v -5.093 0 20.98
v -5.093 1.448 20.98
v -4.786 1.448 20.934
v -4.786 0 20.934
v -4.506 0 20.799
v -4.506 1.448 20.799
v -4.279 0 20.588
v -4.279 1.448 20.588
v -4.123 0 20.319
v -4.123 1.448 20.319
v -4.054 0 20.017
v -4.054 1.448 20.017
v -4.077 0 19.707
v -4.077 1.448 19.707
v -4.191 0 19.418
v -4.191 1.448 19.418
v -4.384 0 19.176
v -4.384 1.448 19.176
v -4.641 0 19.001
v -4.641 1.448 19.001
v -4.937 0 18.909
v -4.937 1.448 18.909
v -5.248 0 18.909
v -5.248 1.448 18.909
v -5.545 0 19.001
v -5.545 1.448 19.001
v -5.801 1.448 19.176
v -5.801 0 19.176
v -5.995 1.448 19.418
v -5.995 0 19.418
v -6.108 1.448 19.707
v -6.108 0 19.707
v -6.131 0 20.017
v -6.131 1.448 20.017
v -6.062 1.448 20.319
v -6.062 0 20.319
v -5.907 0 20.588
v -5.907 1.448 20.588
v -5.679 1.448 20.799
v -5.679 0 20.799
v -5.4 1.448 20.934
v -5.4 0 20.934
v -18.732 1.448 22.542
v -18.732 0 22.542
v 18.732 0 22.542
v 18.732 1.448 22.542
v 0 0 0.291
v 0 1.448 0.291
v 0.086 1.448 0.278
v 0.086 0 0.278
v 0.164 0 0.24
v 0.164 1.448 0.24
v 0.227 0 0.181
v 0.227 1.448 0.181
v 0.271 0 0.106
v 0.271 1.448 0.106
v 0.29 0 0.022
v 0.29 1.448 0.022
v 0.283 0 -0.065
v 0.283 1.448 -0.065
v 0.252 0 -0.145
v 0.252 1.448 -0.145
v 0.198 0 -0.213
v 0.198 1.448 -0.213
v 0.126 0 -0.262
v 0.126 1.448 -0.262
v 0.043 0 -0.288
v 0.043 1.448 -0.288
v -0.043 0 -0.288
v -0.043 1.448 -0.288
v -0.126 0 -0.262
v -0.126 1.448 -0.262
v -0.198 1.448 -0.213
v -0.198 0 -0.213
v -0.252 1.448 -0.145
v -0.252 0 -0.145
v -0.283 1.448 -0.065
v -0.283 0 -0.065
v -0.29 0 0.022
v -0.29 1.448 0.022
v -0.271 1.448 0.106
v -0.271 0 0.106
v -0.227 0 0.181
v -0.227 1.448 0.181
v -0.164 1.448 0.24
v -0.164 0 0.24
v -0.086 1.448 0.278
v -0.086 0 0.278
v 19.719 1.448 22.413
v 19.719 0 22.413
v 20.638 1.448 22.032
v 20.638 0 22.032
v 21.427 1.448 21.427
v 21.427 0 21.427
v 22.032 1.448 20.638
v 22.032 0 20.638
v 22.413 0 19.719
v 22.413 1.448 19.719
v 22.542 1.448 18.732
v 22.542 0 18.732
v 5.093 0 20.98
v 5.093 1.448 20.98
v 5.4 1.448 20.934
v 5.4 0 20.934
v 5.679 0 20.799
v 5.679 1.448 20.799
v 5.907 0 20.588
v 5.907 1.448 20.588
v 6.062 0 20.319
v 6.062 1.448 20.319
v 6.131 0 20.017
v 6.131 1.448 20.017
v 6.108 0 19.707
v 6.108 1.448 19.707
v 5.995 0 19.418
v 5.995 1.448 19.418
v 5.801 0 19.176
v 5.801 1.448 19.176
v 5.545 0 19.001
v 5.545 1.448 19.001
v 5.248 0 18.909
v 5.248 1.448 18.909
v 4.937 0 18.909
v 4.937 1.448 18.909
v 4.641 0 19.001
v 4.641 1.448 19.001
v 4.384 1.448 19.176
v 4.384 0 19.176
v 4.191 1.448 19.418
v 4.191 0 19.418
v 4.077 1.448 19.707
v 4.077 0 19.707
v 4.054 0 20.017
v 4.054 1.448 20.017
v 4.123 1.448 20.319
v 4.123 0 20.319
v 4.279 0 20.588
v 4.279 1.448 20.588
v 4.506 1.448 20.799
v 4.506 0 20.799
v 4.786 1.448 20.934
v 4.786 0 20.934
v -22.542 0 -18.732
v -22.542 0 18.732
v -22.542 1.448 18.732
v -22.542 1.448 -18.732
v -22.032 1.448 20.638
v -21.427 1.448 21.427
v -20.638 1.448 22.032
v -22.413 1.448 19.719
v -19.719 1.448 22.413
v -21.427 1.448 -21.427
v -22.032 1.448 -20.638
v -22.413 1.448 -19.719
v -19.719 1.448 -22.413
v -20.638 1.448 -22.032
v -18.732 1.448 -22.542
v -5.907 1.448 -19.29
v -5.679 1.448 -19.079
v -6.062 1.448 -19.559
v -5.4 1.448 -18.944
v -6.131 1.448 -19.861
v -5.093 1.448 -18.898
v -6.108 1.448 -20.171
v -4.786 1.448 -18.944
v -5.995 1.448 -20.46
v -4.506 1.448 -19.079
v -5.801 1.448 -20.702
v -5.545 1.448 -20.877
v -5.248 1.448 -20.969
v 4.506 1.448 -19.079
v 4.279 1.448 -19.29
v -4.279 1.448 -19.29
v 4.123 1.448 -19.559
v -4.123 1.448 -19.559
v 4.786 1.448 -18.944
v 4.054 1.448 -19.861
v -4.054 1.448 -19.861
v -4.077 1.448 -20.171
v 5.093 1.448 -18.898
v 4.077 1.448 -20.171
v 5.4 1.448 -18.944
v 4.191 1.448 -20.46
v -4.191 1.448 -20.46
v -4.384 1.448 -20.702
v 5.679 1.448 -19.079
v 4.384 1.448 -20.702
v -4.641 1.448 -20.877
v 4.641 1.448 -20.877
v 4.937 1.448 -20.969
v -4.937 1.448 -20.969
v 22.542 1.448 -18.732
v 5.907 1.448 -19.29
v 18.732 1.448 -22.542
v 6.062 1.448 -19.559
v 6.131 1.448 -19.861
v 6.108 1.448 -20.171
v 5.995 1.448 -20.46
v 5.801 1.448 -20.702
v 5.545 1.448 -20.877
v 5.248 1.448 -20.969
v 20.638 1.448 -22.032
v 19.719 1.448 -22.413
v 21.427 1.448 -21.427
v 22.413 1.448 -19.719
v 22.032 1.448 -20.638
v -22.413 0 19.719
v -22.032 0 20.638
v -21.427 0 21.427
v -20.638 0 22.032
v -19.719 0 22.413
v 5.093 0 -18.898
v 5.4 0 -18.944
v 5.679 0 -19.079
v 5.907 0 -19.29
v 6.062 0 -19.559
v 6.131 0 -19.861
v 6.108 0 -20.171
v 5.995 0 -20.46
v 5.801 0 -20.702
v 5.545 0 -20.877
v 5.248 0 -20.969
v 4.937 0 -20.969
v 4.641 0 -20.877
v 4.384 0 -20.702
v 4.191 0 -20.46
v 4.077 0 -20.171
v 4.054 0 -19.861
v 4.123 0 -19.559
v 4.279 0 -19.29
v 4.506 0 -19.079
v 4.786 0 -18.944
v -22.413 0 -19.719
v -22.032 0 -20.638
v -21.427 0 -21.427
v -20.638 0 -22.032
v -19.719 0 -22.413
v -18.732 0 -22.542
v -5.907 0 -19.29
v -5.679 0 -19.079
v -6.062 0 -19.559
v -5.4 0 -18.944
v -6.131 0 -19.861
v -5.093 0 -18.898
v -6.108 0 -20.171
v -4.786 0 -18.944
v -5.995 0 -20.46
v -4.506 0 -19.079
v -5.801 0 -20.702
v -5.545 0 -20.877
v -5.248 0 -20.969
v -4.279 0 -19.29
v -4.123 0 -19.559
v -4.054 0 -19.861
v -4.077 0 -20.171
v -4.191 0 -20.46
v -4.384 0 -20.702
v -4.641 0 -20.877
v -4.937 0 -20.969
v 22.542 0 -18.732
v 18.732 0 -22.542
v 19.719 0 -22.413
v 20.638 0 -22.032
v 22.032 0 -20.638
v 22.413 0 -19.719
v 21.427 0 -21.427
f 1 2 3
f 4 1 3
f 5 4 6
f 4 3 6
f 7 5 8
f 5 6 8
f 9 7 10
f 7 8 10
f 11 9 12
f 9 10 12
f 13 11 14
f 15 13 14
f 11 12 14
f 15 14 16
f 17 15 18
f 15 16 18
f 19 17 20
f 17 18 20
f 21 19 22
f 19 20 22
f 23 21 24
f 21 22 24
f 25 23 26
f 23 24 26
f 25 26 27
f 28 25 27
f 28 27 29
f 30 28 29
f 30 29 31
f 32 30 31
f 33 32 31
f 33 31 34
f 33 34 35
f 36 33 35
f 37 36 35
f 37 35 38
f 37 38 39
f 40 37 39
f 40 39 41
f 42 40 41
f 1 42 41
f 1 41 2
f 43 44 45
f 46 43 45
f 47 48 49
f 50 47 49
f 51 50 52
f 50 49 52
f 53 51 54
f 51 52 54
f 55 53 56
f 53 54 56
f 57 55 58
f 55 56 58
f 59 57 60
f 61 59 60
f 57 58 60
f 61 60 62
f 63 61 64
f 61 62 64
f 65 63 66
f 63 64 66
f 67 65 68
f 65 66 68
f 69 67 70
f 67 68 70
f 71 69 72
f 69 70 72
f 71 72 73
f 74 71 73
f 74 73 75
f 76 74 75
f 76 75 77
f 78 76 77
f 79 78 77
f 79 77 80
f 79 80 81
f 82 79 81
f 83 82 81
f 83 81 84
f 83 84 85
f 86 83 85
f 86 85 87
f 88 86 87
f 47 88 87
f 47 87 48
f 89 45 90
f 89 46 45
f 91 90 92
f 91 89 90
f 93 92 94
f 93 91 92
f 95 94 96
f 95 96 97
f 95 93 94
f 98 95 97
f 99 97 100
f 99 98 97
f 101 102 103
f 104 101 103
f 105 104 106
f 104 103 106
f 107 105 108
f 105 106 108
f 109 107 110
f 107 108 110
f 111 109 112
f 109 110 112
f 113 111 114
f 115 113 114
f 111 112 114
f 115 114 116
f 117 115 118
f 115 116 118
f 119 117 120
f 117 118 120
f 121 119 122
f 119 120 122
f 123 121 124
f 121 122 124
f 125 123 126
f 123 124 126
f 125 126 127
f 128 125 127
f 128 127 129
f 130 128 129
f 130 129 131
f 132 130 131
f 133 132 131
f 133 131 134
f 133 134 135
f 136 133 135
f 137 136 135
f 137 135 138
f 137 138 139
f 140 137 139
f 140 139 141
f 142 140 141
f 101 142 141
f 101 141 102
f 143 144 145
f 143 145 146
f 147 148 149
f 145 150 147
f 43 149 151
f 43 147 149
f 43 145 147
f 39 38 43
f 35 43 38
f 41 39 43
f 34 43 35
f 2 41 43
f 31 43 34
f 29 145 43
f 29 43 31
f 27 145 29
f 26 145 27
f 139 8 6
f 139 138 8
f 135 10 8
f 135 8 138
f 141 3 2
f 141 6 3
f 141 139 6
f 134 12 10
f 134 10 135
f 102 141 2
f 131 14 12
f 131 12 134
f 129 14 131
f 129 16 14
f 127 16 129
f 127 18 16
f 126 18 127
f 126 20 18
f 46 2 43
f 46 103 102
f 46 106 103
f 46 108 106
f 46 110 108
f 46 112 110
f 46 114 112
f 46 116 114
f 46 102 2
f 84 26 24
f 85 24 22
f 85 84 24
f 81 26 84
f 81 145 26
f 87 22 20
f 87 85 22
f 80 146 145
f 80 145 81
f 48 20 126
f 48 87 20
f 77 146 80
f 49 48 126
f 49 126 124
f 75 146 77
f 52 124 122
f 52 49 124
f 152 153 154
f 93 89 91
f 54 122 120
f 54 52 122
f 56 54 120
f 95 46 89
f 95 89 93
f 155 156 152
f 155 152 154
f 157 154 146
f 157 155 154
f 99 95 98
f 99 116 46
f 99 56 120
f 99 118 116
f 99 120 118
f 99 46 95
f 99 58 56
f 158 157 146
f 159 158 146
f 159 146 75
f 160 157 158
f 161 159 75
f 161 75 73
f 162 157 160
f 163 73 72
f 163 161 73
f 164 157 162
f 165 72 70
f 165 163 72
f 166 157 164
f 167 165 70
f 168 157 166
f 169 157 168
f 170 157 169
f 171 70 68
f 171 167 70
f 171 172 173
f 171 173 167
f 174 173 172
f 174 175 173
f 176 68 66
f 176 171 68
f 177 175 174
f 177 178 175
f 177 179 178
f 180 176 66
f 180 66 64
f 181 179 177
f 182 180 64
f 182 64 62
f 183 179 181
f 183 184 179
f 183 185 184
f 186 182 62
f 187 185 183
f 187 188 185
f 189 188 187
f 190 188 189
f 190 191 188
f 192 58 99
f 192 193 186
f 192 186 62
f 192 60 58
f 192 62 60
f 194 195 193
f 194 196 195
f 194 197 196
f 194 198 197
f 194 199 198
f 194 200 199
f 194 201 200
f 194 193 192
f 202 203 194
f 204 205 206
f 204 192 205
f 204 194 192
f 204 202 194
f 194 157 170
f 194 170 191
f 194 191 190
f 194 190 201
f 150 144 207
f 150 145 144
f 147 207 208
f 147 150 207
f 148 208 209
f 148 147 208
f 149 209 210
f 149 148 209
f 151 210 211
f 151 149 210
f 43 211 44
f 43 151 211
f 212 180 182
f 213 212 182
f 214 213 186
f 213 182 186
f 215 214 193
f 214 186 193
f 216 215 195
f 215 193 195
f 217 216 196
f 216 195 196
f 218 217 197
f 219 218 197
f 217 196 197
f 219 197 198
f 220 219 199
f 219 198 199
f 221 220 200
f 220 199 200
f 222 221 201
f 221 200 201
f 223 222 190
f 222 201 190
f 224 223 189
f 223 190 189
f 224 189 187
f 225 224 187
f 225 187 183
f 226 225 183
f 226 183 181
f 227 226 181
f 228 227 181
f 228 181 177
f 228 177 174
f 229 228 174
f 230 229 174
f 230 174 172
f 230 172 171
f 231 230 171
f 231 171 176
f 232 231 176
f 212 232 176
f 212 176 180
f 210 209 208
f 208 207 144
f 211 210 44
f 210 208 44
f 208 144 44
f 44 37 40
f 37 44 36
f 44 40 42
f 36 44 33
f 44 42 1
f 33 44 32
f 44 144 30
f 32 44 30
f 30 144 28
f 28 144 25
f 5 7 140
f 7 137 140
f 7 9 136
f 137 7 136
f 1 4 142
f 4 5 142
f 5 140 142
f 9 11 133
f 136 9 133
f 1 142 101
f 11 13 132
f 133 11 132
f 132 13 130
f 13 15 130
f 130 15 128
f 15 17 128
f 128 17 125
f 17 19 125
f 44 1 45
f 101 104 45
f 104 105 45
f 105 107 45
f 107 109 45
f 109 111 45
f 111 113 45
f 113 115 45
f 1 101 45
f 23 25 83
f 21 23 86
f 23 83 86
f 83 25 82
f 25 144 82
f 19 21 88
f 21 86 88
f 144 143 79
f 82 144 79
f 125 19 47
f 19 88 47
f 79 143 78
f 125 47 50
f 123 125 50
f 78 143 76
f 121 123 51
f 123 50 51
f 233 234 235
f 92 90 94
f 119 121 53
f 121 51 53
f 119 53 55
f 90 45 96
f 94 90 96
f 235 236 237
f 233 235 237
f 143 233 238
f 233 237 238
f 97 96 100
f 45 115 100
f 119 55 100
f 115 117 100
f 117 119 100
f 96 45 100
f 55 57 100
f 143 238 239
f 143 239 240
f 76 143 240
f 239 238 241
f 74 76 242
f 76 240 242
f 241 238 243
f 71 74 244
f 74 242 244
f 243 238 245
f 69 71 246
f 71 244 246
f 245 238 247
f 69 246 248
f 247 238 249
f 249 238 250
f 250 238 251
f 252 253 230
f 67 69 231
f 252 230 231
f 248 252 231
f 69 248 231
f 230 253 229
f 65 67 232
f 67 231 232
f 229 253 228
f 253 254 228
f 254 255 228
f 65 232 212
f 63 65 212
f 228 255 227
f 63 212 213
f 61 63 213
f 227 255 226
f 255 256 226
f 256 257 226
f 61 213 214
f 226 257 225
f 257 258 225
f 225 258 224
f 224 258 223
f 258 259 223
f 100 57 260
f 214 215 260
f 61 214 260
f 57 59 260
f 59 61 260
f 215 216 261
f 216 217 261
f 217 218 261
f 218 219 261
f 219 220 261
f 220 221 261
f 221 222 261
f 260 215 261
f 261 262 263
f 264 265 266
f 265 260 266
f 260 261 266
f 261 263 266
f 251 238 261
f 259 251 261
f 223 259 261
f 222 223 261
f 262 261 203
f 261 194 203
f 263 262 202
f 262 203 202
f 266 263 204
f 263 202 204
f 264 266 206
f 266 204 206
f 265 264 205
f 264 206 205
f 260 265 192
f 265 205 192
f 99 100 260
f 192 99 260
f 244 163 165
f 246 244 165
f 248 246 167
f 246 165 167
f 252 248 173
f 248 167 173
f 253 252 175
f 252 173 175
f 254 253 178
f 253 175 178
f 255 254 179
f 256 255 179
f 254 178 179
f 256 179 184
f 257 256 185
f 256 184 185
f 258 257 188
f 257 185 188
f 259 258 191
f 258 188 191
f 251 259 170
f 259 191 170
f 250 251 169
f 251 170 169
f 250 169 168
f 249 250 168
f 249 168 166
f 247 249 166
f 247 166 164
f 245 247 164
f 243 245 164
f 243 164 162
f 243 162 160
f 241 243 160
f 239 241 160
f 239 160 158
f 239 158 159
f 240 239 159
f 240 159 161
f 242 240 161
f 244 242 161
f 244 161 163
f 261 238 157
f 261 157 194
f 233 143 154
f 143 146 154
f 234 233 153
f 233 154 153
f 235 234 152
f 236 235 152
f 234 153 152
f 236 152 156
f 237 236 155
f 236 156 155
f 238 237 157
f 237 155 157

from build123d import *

# Parameters (mm, degrees)
SKETCH1_W           = 45.085
SKETCH1_H           = 45.085
BOSS_EXTRUDE1_DEPTH = 1.4478
SKETCH2_R           = 0.290766207
SKETCH2_R_2         = 1.0414
CUT_EXTRUDE1_DEPTH  = 3.54
FILLET1_R           = 3.81


with BuildPart() as part:
    # Sketch1 → Boss-Extrude1 (new body)
    with BuildSketch(Plane(origin=(0, 0, 0), x_dir=(1, 0, 0), z_dir=(0, 1, 0))):
        Rectangle(SKETCH1_W, SKETCH1_H)
    extrude(amount=BOSS_EXTRUDE1_DEPTH)

    # Sketch2 → Cut-Extrude1 (cut)
    with BuildSketch(Plane(origin=(0, 1.4478, 0), x_dir=(1, 0, 0), z_dir=(0, 1, 0))):
        with Locations(Location((0, 0, 0), (0, 0, 270))):
            Circle(SKETCH2_R)
        with Locations(Location((-5.0927, 19.939, 0), (0, 0, 270))):
            Circle(SKETCH2_R_2)
        with Locations(Location((5.0927, 19.939, 0), (0, 0, 270))):
            Circle(SKETCH2_R_2)
        with Locations(Location((5.0927, -19.939, 0), (0, 0, 270))):
            Circle(SKETCH2_R_2)
        with Locations(Location((-5.0927, -19.939, 0), (0, 0, 270))):
            Circle(SKETCH2_R_2)
    extrude(amount=-CUT_EXTRUDE1_DEPTH, mode=Mode.SUBTRACT)

    # Fillet1
    fillet1_edges = [part.edges().sort_by_distance(p)[0] for p in [
        (22.5425, 0.7239, 22.5425),
        (-22.5425, 0.7239, 22.5425),
        (-22.5425, 0.7239, -22.5425),
        (22.5425, 0.7239, -22.5425),
    ]]
    fillet(fillet1_edges, radius=FILLET1_R)


solid = part.part
